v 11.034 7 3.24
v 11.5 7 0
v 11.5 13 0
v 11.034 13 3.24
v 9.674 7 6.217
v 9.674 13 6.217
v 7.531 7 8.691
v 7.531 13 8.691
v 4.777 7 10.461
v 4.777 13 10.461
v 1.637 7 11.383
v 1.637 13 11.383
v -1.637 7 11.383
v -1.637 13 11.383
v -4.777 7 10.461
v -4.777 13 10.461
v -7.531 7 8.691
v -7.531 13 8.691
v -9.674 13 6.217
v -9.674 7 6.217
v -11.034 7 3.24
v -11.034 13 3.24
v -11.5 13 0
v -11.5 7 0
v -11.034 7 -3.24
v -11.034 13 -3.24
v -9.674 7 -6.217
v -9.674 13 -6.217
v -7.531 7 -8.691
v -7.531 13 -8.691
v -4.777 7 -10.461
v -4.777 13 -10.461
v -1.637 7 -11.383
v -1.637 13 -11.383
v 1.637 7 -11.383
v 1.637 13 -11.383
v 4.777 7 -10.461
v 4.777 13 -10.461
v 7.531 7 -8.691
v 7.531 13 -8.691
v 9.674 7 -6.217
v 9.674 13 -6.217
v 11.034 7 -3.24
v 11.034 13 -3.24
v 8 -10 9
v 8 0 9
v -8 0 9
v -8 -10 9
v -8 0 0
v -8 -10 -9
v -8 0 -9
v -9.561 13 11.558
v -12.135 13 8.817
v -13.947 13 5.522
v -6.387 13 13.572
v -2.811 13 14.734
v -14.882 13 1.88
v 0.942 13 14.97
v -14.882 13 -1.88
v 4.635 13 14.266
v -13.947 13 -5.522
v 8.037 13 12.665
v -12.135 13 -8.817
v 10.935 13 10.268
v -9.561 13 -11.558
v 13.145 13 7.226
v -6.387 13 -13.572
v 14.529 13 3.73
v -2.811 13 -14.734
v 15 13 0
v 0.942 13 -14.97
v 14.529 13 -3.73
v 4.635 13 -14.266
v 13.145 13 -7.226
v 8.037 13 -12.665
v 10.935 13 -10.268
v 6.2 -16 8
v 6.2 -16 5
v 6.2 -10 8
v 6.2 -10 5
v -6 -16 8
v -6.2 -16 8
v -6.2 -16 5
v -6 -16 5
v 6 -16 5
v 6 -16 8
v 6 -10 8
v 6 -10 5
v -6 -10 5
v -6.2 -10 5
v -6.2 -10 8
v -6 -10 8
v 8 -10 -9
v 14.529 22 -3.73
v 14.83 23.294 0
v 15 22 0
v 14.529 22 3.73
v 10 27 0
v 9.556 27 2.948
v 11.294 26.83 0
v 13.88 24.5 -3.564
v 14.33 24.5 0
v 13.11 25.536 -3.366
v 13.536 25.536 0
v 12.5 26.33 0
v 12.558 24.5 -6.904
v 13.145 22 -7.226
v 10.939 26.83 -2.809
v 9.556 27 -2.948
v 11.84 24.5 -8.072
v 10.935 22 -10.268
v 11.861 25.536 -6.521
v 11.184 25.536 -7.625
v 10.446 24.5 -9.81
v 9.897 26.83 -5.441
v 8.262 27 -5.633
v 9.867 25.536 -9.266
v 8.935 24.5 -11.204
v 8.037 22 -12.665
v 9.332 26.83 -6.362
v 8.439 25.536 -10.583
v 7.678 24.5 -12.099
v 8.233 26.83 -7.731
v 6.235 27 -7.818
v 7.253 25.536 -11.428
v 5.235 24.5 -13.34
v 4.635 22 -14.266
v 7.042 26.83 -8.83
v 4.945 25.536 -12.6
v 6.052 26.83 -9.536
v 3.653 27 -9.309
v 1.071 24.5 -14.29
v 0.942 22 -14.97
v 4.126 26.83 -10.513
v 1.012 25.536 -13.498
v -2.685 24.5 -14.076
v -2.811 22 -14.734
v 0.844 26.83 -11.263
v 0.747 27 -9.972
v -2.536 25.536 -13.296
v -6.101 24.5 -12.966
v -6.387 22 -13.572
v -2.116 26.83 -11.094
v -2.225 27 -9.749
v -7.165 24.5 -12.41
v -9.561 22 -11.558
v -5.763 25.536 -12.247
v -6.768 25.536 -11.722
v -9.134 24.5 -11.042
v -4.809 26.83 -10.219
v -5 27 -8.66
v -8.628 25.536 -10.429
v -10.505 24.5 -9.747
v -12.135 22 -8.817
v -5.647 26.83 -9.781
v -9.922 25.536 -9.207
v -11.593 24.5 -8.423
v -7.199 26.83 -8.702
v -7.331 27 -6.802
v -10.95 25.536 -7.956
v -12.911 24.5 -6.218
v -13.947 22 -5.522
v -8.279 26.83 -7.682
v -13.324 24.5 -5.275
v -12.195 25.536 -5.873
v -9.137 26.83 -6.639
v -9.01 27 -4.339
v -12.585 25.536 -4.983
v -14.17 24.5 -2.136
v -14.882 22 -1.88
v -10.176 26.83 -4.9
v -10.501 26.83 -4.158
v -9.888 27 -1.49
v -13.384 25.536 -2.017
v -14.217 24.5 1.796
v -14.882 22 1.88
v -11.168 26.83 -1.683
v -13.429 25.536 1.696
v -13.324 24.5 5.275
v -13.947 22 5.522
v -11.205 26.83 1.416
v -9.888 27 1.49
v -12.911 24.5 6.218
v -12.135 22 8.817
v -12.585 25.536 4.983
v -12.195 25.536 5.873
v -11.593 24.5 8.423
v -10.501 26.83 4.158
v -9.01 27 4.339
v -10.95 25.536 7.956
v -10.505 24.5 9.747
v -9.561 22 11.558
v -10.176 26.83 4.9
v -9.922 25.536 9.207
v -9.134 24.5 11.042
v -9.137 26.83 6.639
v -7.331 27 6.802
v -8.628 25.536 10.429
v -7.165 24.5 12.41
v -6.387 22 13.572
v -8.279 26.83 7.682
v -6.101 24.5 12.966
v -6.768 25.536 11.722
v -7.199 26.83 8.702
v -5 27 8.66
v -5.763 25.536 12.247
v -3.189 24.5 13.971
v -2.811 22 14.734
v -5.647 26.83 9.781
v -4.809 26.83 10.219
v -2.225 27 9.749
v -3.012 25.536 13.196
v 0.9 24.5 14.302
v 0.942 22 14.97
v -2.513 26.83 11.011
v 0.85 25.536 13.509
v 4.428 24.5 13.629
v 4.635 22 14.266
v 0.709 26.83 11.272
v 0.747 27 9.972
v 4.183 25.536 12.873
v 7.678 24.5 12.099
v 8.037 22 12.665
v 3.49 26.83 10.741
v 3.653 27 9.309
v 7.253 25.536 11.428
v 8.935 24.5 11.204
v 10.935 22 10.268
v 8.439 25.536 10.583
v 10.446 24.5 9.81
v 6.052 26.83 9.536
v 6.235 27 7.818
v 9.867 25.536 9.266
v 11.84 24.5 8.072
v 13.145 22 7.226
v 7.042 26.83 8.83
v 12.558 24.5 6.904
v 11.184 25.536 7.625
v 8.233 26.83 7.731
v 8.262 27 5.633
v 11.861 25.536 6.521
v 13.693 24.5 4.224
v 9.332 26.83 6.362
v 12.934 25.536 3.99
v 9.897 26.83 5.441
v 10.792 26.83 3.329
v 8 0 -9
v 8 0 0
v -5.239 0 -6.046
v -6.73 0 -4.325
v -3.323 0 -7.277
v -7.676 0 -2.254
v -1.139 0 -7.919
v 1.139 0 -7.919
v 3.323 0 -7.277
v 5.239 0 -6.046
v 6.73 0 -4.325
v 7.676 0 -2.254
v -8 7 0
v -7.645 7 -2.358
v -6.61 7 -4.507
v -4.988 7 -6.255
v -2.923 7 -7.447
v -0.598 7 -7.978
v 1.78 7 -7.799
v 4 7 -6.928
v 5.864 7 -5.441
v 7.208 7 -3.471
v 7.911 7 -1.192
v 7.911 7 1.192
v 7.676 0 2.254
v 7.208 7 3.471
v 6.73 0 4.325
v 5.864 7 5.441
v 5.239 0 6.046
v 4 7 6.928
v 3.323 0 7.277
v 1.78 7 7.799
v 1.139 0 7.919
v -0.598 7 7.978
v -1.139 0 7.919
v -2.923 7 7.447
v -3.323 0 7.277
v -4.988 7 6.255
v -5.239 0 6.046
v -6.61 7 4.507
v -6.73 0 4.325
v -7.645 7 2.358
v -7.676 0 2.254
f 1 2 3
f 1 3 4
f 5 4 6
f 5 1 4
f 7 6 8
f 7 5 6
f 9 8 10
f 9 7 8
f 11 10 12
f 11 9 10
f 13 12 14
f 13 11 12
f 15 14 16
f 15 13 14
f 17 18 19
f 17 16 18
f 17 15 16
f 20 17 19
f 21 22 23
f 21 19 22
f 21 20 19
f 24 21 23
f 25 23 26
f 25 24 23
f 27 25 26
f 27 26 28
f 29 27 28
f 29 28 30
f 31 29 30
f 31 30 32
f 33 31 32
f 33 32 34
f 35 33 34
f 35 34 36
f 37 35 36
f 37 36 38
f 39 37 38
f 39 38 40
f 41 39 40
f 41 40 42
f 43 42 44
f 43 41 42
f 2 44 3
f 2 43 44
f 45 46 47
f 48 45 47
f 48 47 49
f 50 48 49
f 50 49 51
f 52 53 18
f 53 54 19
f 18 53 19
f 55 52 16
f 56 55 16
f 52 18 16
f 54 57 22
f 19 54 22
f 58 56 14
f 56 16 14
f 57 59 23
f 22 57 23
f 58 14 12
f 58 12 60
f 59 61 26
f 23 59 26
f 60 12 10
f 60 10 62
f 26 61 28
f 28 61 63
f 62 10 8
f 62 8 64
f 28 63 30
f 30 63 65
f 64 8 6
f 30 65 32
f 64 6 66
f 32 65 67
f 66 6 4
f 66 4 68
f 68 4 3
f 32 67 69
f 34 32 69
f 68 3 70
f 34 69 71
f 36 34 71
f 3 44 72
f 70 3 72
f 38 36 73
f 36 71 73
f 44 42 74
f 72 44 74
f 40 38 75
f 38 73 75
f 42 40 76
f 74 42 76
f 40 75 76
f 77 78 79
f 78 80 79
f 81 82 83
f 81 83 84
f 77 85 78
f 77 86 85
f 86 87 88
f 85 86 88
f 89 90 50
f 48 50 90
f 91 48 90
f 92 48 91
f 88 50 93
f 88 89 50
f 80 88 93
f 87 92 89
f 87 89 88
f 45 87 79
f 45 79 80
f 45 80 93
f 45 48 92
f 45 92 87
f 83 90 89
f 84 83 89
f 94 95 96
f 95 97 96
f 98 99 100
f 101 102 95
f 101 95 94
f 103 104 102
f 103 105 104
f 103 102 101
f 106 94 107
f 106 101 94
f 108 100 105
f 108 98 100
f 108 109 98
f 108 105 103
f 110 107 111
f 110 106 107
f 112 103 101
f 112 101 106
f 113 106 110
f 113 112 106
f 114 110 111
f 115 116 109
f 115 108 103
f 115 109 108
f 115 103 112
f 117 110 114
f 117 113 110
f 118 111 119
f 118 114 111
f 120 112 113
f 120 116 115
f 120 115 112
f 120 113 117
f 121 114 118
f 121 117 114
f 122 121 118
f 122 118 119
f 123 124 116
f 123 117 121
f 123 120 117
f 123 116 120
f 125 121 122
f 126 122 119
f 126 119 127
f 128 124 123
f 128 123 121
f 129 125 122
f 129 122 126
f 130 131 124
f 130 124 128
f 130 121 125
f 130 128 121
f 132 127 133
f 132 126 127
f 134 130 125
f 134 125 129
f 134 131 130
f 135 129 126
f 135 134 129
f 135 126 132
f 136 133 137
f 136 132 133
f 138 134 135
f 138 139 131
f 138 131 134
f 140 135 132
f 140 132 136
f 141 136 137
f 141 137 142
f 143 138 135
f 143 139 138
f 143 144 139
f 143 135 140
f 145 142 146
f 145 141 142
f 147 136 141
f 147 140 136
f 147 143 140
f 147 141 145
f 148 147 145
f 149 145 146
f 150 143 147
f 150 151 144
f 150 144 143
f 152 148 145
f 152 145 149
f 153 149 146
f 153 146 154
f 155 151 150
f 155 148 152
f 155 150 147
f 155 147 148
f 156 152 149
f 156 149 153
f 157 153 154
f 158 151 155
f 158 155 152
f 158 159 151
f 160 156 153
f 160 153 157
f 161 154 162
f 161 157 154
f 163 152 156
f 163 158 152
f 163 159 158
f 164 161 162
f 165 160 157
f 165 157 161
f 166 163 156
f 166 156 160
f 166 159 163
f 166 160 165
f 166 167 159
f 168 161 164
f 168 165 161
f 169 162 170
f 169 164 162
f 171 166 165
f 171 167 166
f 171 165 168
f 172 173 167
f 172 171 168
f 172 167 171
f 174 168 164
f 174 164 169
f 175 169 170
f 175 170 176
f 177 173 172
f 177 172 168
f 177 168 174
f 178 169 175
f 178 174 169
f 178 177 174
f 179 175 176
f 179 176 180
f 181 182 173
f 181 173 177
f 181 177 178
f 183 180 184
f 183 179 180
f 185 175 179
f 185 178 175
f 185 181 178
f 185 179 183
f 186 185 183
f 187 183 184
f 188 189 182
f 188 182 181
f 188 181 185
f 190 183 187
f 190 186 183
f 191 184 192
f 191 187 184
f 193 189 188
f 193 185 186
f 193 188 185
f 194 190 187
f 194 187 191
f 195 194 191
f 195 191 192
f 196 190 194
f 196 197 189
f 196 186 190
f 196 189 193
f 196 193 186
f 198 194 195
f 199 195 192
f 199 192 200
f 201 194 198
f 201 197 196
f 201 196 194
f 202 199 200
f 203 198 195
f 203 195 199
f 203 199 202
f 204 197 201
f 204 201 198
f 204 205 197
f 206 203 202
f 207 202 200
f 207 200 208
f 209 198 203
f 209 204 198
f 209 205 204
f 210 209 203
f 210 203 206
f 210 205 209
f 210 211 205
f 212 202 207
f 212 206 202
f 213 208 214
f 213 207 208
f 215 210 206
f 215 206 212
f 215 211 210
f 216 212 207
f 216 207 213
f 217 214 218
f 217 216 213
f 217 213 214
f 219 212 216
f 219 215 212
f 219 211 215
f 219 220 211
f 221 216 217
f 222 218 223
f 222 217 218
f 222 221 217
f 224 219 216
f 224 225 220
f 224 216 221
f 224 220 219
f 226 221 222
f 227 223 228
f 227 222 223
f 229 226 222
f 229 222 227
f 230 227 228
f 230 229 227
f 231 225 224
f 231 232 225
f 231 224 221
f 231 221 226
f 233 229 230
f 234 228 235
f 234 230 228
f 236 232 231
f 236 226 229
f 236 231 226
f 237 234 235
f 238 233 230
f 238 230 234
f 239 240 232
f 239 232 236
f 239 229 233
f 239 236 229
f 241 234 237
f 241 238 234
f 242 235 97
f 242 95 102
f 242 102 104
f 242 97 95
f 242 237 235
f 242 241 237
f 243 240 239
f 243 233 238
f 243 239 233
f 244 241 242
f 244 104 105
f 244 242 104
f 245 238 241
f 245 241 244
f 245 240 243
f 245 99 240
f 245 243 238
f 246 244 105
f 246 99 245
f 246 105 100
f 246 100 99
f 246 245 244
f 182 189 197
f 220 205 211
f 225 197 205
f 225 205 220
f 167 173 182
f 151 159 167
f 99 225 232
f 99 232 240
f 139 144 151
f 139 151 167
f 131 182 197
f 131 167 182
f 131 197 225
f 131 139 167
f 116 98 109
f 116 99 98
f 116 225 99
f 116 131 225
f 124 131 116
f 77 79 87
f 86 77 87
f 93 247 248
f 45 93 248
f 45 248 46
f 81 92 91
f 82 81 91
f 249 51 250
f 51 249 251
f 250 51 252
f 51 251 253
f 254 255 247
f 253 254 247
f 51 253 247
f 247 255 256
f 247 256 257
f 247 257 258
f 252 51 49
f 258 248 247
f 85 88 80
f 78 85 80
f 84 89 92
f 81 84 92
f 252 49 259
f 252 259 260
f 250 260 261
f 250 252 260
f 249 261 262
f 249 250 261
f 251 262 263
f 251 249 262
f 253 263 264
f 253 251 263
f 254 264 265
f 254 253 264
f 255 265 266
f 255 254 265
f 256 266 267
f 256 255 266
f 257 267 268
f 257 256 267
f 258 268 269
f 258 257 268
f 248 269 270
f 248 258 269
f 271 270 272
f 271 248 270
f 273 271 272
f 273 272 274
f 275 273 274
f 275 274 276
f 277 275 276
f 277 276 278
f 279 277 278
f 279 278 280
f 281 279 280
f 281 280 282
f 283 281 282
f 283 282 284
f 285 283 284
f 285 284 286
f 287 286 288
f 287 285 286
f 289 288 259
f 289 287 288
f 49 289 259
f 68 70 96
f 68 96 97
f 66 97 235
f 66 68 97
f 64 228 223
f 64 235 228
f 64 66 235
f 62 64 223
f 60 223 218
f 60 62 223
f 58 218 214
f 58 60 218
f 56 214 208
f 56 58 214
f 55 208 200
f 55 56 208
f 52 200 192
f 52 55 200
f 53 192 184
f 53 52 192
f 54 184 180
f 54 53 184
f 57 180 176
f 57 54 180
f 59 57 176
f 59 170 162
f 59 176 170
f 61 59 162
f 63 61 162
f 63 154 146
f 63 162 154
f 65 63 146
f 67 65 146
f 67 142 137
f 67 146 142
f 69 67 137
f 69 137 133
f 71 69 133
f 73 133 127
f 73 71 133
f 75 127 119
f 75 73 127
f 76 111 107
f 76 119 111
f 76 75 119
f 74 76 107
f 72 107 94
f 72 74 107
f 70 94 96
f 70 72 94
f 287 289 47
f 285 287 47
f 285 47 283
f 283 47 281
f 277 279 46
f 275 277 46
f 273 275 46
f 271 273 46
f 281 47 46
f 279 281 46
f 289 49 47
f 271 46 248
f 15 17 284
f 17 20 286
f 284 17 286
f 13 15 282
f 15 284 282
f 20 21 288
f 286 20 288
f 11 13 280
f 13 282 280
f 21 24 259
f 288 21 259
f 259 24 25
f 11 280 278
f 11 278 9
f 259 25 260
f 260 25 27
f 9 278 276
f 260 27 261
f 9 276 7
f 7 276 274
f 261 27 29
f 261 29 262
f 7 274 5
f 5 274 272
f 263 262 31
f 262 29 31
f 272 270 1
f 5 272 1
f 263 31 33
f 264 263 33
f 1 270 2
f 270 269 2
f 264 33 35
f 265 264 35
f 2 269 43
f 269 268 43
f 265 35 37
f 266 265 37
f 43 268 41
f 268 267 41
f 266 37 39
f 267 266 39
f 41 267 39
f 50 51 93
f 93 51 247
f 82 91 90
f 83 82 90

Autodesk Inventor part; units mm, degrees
ref_plane "YZ Plane" through (0, 0, 0) normal (1, 0, 0) x (0, 1, 0)
ref_plane "XZ Plane" through (0, 0, 0) normal (0, 1, 0) x (-1, 0, 0)
ref_plane "XY Plane" through (0, 0, 0) normal (0, 0, 1) x (1, 0, 0)
sketch "スケッチ1" plane through (0, 0, 0) normal (0, 1, 0) x (-1, 0, 0)
  circle A0 centre (0, 0) radius 8
  dimension "d0" = 16
extrude "押し出し1" add sketch "スケッチ1" along normal blind 7
sketch "スケッチ2" plane through (0, 7, 0) normal (0, 1, 0) x (1, 0, 0)
  circle A0 centre (0, 0) radius 11.5
  dimension "d3" = 23
extrude "押し出し2" add sketch "スケッチ2" along normal blind 6
sketch "スケッチ3" plane through (0, 13, 0) normal (0, 1, 0) x (1, 0, 0)
  circle A0 centre (0, 0) radius 15
  dimension "d6" = 30
extrude "押し出し3" add sketch "スケッチ3" along normal blind 14
fillet "フィレット1" radius 5 1 edges at (-15, 27, 0)
sketch "スケッチ4" plane through (0, 0, 0) normal (0, -1, 0) x (1, 0, 0)
  line L0 (8, 9) -> (-8, 9)
  line L1 (-8, 9) -> (-8, -9)
  line L2 (-8, -9) -> (8, -9)
  line L3 (8, -9) -> (8, 9)
  circle A0 centre (0, 0) radius 10 projected
  line L4 (8, 9) -> (-8, -9) construction
  line L5 (-8, 9) -> (8, -9) construction
  dimension "d10" = 16
  dimension "d11" = 18
extrude "押し出し4" add sketch "スケッチ4" along normal blind 10 contours L3 A0 L0 | A0 L3 L2 L1 L0 | A0 L1 L0 | L3 L2 A0 | A0 L2 L1
sketch "スケッチ5" plane through (0, -10, 0) normal (0, -1, 0) x (1, 0, 0)
  line L0 (-6, 8) -> (-6.2, 8)
  line L1 (-6.2, 8) -> (-6.2, 5)
  line L2 (-6.2, 5) -> (-6, 5)
  line L3 (-6, 5) -> (-6, 8)
  line L4 (6.2, 8) -> (6, 8)
  line L5 (6, 8) -> (6, 5)
  line L6 (6, 5) -> (6.2, 5)
  line L7 (6.2, 5) -> (6.2, 8)
  line L8 (0, -21) -> (0, 21) projected
  line L9 (8, 9) -> (-8, 9) projected
  point P0 (0, 0)
  point P1 (6.1, 8)
  dimension "d14" = 0.2
  dimension "d15" = 3
  dimension "d16" = 6
  dimension "d17" = 1
extrude "押し出し5" add sketch "スケッチ5" along normal blind 6
properties part number "emergency_button"
